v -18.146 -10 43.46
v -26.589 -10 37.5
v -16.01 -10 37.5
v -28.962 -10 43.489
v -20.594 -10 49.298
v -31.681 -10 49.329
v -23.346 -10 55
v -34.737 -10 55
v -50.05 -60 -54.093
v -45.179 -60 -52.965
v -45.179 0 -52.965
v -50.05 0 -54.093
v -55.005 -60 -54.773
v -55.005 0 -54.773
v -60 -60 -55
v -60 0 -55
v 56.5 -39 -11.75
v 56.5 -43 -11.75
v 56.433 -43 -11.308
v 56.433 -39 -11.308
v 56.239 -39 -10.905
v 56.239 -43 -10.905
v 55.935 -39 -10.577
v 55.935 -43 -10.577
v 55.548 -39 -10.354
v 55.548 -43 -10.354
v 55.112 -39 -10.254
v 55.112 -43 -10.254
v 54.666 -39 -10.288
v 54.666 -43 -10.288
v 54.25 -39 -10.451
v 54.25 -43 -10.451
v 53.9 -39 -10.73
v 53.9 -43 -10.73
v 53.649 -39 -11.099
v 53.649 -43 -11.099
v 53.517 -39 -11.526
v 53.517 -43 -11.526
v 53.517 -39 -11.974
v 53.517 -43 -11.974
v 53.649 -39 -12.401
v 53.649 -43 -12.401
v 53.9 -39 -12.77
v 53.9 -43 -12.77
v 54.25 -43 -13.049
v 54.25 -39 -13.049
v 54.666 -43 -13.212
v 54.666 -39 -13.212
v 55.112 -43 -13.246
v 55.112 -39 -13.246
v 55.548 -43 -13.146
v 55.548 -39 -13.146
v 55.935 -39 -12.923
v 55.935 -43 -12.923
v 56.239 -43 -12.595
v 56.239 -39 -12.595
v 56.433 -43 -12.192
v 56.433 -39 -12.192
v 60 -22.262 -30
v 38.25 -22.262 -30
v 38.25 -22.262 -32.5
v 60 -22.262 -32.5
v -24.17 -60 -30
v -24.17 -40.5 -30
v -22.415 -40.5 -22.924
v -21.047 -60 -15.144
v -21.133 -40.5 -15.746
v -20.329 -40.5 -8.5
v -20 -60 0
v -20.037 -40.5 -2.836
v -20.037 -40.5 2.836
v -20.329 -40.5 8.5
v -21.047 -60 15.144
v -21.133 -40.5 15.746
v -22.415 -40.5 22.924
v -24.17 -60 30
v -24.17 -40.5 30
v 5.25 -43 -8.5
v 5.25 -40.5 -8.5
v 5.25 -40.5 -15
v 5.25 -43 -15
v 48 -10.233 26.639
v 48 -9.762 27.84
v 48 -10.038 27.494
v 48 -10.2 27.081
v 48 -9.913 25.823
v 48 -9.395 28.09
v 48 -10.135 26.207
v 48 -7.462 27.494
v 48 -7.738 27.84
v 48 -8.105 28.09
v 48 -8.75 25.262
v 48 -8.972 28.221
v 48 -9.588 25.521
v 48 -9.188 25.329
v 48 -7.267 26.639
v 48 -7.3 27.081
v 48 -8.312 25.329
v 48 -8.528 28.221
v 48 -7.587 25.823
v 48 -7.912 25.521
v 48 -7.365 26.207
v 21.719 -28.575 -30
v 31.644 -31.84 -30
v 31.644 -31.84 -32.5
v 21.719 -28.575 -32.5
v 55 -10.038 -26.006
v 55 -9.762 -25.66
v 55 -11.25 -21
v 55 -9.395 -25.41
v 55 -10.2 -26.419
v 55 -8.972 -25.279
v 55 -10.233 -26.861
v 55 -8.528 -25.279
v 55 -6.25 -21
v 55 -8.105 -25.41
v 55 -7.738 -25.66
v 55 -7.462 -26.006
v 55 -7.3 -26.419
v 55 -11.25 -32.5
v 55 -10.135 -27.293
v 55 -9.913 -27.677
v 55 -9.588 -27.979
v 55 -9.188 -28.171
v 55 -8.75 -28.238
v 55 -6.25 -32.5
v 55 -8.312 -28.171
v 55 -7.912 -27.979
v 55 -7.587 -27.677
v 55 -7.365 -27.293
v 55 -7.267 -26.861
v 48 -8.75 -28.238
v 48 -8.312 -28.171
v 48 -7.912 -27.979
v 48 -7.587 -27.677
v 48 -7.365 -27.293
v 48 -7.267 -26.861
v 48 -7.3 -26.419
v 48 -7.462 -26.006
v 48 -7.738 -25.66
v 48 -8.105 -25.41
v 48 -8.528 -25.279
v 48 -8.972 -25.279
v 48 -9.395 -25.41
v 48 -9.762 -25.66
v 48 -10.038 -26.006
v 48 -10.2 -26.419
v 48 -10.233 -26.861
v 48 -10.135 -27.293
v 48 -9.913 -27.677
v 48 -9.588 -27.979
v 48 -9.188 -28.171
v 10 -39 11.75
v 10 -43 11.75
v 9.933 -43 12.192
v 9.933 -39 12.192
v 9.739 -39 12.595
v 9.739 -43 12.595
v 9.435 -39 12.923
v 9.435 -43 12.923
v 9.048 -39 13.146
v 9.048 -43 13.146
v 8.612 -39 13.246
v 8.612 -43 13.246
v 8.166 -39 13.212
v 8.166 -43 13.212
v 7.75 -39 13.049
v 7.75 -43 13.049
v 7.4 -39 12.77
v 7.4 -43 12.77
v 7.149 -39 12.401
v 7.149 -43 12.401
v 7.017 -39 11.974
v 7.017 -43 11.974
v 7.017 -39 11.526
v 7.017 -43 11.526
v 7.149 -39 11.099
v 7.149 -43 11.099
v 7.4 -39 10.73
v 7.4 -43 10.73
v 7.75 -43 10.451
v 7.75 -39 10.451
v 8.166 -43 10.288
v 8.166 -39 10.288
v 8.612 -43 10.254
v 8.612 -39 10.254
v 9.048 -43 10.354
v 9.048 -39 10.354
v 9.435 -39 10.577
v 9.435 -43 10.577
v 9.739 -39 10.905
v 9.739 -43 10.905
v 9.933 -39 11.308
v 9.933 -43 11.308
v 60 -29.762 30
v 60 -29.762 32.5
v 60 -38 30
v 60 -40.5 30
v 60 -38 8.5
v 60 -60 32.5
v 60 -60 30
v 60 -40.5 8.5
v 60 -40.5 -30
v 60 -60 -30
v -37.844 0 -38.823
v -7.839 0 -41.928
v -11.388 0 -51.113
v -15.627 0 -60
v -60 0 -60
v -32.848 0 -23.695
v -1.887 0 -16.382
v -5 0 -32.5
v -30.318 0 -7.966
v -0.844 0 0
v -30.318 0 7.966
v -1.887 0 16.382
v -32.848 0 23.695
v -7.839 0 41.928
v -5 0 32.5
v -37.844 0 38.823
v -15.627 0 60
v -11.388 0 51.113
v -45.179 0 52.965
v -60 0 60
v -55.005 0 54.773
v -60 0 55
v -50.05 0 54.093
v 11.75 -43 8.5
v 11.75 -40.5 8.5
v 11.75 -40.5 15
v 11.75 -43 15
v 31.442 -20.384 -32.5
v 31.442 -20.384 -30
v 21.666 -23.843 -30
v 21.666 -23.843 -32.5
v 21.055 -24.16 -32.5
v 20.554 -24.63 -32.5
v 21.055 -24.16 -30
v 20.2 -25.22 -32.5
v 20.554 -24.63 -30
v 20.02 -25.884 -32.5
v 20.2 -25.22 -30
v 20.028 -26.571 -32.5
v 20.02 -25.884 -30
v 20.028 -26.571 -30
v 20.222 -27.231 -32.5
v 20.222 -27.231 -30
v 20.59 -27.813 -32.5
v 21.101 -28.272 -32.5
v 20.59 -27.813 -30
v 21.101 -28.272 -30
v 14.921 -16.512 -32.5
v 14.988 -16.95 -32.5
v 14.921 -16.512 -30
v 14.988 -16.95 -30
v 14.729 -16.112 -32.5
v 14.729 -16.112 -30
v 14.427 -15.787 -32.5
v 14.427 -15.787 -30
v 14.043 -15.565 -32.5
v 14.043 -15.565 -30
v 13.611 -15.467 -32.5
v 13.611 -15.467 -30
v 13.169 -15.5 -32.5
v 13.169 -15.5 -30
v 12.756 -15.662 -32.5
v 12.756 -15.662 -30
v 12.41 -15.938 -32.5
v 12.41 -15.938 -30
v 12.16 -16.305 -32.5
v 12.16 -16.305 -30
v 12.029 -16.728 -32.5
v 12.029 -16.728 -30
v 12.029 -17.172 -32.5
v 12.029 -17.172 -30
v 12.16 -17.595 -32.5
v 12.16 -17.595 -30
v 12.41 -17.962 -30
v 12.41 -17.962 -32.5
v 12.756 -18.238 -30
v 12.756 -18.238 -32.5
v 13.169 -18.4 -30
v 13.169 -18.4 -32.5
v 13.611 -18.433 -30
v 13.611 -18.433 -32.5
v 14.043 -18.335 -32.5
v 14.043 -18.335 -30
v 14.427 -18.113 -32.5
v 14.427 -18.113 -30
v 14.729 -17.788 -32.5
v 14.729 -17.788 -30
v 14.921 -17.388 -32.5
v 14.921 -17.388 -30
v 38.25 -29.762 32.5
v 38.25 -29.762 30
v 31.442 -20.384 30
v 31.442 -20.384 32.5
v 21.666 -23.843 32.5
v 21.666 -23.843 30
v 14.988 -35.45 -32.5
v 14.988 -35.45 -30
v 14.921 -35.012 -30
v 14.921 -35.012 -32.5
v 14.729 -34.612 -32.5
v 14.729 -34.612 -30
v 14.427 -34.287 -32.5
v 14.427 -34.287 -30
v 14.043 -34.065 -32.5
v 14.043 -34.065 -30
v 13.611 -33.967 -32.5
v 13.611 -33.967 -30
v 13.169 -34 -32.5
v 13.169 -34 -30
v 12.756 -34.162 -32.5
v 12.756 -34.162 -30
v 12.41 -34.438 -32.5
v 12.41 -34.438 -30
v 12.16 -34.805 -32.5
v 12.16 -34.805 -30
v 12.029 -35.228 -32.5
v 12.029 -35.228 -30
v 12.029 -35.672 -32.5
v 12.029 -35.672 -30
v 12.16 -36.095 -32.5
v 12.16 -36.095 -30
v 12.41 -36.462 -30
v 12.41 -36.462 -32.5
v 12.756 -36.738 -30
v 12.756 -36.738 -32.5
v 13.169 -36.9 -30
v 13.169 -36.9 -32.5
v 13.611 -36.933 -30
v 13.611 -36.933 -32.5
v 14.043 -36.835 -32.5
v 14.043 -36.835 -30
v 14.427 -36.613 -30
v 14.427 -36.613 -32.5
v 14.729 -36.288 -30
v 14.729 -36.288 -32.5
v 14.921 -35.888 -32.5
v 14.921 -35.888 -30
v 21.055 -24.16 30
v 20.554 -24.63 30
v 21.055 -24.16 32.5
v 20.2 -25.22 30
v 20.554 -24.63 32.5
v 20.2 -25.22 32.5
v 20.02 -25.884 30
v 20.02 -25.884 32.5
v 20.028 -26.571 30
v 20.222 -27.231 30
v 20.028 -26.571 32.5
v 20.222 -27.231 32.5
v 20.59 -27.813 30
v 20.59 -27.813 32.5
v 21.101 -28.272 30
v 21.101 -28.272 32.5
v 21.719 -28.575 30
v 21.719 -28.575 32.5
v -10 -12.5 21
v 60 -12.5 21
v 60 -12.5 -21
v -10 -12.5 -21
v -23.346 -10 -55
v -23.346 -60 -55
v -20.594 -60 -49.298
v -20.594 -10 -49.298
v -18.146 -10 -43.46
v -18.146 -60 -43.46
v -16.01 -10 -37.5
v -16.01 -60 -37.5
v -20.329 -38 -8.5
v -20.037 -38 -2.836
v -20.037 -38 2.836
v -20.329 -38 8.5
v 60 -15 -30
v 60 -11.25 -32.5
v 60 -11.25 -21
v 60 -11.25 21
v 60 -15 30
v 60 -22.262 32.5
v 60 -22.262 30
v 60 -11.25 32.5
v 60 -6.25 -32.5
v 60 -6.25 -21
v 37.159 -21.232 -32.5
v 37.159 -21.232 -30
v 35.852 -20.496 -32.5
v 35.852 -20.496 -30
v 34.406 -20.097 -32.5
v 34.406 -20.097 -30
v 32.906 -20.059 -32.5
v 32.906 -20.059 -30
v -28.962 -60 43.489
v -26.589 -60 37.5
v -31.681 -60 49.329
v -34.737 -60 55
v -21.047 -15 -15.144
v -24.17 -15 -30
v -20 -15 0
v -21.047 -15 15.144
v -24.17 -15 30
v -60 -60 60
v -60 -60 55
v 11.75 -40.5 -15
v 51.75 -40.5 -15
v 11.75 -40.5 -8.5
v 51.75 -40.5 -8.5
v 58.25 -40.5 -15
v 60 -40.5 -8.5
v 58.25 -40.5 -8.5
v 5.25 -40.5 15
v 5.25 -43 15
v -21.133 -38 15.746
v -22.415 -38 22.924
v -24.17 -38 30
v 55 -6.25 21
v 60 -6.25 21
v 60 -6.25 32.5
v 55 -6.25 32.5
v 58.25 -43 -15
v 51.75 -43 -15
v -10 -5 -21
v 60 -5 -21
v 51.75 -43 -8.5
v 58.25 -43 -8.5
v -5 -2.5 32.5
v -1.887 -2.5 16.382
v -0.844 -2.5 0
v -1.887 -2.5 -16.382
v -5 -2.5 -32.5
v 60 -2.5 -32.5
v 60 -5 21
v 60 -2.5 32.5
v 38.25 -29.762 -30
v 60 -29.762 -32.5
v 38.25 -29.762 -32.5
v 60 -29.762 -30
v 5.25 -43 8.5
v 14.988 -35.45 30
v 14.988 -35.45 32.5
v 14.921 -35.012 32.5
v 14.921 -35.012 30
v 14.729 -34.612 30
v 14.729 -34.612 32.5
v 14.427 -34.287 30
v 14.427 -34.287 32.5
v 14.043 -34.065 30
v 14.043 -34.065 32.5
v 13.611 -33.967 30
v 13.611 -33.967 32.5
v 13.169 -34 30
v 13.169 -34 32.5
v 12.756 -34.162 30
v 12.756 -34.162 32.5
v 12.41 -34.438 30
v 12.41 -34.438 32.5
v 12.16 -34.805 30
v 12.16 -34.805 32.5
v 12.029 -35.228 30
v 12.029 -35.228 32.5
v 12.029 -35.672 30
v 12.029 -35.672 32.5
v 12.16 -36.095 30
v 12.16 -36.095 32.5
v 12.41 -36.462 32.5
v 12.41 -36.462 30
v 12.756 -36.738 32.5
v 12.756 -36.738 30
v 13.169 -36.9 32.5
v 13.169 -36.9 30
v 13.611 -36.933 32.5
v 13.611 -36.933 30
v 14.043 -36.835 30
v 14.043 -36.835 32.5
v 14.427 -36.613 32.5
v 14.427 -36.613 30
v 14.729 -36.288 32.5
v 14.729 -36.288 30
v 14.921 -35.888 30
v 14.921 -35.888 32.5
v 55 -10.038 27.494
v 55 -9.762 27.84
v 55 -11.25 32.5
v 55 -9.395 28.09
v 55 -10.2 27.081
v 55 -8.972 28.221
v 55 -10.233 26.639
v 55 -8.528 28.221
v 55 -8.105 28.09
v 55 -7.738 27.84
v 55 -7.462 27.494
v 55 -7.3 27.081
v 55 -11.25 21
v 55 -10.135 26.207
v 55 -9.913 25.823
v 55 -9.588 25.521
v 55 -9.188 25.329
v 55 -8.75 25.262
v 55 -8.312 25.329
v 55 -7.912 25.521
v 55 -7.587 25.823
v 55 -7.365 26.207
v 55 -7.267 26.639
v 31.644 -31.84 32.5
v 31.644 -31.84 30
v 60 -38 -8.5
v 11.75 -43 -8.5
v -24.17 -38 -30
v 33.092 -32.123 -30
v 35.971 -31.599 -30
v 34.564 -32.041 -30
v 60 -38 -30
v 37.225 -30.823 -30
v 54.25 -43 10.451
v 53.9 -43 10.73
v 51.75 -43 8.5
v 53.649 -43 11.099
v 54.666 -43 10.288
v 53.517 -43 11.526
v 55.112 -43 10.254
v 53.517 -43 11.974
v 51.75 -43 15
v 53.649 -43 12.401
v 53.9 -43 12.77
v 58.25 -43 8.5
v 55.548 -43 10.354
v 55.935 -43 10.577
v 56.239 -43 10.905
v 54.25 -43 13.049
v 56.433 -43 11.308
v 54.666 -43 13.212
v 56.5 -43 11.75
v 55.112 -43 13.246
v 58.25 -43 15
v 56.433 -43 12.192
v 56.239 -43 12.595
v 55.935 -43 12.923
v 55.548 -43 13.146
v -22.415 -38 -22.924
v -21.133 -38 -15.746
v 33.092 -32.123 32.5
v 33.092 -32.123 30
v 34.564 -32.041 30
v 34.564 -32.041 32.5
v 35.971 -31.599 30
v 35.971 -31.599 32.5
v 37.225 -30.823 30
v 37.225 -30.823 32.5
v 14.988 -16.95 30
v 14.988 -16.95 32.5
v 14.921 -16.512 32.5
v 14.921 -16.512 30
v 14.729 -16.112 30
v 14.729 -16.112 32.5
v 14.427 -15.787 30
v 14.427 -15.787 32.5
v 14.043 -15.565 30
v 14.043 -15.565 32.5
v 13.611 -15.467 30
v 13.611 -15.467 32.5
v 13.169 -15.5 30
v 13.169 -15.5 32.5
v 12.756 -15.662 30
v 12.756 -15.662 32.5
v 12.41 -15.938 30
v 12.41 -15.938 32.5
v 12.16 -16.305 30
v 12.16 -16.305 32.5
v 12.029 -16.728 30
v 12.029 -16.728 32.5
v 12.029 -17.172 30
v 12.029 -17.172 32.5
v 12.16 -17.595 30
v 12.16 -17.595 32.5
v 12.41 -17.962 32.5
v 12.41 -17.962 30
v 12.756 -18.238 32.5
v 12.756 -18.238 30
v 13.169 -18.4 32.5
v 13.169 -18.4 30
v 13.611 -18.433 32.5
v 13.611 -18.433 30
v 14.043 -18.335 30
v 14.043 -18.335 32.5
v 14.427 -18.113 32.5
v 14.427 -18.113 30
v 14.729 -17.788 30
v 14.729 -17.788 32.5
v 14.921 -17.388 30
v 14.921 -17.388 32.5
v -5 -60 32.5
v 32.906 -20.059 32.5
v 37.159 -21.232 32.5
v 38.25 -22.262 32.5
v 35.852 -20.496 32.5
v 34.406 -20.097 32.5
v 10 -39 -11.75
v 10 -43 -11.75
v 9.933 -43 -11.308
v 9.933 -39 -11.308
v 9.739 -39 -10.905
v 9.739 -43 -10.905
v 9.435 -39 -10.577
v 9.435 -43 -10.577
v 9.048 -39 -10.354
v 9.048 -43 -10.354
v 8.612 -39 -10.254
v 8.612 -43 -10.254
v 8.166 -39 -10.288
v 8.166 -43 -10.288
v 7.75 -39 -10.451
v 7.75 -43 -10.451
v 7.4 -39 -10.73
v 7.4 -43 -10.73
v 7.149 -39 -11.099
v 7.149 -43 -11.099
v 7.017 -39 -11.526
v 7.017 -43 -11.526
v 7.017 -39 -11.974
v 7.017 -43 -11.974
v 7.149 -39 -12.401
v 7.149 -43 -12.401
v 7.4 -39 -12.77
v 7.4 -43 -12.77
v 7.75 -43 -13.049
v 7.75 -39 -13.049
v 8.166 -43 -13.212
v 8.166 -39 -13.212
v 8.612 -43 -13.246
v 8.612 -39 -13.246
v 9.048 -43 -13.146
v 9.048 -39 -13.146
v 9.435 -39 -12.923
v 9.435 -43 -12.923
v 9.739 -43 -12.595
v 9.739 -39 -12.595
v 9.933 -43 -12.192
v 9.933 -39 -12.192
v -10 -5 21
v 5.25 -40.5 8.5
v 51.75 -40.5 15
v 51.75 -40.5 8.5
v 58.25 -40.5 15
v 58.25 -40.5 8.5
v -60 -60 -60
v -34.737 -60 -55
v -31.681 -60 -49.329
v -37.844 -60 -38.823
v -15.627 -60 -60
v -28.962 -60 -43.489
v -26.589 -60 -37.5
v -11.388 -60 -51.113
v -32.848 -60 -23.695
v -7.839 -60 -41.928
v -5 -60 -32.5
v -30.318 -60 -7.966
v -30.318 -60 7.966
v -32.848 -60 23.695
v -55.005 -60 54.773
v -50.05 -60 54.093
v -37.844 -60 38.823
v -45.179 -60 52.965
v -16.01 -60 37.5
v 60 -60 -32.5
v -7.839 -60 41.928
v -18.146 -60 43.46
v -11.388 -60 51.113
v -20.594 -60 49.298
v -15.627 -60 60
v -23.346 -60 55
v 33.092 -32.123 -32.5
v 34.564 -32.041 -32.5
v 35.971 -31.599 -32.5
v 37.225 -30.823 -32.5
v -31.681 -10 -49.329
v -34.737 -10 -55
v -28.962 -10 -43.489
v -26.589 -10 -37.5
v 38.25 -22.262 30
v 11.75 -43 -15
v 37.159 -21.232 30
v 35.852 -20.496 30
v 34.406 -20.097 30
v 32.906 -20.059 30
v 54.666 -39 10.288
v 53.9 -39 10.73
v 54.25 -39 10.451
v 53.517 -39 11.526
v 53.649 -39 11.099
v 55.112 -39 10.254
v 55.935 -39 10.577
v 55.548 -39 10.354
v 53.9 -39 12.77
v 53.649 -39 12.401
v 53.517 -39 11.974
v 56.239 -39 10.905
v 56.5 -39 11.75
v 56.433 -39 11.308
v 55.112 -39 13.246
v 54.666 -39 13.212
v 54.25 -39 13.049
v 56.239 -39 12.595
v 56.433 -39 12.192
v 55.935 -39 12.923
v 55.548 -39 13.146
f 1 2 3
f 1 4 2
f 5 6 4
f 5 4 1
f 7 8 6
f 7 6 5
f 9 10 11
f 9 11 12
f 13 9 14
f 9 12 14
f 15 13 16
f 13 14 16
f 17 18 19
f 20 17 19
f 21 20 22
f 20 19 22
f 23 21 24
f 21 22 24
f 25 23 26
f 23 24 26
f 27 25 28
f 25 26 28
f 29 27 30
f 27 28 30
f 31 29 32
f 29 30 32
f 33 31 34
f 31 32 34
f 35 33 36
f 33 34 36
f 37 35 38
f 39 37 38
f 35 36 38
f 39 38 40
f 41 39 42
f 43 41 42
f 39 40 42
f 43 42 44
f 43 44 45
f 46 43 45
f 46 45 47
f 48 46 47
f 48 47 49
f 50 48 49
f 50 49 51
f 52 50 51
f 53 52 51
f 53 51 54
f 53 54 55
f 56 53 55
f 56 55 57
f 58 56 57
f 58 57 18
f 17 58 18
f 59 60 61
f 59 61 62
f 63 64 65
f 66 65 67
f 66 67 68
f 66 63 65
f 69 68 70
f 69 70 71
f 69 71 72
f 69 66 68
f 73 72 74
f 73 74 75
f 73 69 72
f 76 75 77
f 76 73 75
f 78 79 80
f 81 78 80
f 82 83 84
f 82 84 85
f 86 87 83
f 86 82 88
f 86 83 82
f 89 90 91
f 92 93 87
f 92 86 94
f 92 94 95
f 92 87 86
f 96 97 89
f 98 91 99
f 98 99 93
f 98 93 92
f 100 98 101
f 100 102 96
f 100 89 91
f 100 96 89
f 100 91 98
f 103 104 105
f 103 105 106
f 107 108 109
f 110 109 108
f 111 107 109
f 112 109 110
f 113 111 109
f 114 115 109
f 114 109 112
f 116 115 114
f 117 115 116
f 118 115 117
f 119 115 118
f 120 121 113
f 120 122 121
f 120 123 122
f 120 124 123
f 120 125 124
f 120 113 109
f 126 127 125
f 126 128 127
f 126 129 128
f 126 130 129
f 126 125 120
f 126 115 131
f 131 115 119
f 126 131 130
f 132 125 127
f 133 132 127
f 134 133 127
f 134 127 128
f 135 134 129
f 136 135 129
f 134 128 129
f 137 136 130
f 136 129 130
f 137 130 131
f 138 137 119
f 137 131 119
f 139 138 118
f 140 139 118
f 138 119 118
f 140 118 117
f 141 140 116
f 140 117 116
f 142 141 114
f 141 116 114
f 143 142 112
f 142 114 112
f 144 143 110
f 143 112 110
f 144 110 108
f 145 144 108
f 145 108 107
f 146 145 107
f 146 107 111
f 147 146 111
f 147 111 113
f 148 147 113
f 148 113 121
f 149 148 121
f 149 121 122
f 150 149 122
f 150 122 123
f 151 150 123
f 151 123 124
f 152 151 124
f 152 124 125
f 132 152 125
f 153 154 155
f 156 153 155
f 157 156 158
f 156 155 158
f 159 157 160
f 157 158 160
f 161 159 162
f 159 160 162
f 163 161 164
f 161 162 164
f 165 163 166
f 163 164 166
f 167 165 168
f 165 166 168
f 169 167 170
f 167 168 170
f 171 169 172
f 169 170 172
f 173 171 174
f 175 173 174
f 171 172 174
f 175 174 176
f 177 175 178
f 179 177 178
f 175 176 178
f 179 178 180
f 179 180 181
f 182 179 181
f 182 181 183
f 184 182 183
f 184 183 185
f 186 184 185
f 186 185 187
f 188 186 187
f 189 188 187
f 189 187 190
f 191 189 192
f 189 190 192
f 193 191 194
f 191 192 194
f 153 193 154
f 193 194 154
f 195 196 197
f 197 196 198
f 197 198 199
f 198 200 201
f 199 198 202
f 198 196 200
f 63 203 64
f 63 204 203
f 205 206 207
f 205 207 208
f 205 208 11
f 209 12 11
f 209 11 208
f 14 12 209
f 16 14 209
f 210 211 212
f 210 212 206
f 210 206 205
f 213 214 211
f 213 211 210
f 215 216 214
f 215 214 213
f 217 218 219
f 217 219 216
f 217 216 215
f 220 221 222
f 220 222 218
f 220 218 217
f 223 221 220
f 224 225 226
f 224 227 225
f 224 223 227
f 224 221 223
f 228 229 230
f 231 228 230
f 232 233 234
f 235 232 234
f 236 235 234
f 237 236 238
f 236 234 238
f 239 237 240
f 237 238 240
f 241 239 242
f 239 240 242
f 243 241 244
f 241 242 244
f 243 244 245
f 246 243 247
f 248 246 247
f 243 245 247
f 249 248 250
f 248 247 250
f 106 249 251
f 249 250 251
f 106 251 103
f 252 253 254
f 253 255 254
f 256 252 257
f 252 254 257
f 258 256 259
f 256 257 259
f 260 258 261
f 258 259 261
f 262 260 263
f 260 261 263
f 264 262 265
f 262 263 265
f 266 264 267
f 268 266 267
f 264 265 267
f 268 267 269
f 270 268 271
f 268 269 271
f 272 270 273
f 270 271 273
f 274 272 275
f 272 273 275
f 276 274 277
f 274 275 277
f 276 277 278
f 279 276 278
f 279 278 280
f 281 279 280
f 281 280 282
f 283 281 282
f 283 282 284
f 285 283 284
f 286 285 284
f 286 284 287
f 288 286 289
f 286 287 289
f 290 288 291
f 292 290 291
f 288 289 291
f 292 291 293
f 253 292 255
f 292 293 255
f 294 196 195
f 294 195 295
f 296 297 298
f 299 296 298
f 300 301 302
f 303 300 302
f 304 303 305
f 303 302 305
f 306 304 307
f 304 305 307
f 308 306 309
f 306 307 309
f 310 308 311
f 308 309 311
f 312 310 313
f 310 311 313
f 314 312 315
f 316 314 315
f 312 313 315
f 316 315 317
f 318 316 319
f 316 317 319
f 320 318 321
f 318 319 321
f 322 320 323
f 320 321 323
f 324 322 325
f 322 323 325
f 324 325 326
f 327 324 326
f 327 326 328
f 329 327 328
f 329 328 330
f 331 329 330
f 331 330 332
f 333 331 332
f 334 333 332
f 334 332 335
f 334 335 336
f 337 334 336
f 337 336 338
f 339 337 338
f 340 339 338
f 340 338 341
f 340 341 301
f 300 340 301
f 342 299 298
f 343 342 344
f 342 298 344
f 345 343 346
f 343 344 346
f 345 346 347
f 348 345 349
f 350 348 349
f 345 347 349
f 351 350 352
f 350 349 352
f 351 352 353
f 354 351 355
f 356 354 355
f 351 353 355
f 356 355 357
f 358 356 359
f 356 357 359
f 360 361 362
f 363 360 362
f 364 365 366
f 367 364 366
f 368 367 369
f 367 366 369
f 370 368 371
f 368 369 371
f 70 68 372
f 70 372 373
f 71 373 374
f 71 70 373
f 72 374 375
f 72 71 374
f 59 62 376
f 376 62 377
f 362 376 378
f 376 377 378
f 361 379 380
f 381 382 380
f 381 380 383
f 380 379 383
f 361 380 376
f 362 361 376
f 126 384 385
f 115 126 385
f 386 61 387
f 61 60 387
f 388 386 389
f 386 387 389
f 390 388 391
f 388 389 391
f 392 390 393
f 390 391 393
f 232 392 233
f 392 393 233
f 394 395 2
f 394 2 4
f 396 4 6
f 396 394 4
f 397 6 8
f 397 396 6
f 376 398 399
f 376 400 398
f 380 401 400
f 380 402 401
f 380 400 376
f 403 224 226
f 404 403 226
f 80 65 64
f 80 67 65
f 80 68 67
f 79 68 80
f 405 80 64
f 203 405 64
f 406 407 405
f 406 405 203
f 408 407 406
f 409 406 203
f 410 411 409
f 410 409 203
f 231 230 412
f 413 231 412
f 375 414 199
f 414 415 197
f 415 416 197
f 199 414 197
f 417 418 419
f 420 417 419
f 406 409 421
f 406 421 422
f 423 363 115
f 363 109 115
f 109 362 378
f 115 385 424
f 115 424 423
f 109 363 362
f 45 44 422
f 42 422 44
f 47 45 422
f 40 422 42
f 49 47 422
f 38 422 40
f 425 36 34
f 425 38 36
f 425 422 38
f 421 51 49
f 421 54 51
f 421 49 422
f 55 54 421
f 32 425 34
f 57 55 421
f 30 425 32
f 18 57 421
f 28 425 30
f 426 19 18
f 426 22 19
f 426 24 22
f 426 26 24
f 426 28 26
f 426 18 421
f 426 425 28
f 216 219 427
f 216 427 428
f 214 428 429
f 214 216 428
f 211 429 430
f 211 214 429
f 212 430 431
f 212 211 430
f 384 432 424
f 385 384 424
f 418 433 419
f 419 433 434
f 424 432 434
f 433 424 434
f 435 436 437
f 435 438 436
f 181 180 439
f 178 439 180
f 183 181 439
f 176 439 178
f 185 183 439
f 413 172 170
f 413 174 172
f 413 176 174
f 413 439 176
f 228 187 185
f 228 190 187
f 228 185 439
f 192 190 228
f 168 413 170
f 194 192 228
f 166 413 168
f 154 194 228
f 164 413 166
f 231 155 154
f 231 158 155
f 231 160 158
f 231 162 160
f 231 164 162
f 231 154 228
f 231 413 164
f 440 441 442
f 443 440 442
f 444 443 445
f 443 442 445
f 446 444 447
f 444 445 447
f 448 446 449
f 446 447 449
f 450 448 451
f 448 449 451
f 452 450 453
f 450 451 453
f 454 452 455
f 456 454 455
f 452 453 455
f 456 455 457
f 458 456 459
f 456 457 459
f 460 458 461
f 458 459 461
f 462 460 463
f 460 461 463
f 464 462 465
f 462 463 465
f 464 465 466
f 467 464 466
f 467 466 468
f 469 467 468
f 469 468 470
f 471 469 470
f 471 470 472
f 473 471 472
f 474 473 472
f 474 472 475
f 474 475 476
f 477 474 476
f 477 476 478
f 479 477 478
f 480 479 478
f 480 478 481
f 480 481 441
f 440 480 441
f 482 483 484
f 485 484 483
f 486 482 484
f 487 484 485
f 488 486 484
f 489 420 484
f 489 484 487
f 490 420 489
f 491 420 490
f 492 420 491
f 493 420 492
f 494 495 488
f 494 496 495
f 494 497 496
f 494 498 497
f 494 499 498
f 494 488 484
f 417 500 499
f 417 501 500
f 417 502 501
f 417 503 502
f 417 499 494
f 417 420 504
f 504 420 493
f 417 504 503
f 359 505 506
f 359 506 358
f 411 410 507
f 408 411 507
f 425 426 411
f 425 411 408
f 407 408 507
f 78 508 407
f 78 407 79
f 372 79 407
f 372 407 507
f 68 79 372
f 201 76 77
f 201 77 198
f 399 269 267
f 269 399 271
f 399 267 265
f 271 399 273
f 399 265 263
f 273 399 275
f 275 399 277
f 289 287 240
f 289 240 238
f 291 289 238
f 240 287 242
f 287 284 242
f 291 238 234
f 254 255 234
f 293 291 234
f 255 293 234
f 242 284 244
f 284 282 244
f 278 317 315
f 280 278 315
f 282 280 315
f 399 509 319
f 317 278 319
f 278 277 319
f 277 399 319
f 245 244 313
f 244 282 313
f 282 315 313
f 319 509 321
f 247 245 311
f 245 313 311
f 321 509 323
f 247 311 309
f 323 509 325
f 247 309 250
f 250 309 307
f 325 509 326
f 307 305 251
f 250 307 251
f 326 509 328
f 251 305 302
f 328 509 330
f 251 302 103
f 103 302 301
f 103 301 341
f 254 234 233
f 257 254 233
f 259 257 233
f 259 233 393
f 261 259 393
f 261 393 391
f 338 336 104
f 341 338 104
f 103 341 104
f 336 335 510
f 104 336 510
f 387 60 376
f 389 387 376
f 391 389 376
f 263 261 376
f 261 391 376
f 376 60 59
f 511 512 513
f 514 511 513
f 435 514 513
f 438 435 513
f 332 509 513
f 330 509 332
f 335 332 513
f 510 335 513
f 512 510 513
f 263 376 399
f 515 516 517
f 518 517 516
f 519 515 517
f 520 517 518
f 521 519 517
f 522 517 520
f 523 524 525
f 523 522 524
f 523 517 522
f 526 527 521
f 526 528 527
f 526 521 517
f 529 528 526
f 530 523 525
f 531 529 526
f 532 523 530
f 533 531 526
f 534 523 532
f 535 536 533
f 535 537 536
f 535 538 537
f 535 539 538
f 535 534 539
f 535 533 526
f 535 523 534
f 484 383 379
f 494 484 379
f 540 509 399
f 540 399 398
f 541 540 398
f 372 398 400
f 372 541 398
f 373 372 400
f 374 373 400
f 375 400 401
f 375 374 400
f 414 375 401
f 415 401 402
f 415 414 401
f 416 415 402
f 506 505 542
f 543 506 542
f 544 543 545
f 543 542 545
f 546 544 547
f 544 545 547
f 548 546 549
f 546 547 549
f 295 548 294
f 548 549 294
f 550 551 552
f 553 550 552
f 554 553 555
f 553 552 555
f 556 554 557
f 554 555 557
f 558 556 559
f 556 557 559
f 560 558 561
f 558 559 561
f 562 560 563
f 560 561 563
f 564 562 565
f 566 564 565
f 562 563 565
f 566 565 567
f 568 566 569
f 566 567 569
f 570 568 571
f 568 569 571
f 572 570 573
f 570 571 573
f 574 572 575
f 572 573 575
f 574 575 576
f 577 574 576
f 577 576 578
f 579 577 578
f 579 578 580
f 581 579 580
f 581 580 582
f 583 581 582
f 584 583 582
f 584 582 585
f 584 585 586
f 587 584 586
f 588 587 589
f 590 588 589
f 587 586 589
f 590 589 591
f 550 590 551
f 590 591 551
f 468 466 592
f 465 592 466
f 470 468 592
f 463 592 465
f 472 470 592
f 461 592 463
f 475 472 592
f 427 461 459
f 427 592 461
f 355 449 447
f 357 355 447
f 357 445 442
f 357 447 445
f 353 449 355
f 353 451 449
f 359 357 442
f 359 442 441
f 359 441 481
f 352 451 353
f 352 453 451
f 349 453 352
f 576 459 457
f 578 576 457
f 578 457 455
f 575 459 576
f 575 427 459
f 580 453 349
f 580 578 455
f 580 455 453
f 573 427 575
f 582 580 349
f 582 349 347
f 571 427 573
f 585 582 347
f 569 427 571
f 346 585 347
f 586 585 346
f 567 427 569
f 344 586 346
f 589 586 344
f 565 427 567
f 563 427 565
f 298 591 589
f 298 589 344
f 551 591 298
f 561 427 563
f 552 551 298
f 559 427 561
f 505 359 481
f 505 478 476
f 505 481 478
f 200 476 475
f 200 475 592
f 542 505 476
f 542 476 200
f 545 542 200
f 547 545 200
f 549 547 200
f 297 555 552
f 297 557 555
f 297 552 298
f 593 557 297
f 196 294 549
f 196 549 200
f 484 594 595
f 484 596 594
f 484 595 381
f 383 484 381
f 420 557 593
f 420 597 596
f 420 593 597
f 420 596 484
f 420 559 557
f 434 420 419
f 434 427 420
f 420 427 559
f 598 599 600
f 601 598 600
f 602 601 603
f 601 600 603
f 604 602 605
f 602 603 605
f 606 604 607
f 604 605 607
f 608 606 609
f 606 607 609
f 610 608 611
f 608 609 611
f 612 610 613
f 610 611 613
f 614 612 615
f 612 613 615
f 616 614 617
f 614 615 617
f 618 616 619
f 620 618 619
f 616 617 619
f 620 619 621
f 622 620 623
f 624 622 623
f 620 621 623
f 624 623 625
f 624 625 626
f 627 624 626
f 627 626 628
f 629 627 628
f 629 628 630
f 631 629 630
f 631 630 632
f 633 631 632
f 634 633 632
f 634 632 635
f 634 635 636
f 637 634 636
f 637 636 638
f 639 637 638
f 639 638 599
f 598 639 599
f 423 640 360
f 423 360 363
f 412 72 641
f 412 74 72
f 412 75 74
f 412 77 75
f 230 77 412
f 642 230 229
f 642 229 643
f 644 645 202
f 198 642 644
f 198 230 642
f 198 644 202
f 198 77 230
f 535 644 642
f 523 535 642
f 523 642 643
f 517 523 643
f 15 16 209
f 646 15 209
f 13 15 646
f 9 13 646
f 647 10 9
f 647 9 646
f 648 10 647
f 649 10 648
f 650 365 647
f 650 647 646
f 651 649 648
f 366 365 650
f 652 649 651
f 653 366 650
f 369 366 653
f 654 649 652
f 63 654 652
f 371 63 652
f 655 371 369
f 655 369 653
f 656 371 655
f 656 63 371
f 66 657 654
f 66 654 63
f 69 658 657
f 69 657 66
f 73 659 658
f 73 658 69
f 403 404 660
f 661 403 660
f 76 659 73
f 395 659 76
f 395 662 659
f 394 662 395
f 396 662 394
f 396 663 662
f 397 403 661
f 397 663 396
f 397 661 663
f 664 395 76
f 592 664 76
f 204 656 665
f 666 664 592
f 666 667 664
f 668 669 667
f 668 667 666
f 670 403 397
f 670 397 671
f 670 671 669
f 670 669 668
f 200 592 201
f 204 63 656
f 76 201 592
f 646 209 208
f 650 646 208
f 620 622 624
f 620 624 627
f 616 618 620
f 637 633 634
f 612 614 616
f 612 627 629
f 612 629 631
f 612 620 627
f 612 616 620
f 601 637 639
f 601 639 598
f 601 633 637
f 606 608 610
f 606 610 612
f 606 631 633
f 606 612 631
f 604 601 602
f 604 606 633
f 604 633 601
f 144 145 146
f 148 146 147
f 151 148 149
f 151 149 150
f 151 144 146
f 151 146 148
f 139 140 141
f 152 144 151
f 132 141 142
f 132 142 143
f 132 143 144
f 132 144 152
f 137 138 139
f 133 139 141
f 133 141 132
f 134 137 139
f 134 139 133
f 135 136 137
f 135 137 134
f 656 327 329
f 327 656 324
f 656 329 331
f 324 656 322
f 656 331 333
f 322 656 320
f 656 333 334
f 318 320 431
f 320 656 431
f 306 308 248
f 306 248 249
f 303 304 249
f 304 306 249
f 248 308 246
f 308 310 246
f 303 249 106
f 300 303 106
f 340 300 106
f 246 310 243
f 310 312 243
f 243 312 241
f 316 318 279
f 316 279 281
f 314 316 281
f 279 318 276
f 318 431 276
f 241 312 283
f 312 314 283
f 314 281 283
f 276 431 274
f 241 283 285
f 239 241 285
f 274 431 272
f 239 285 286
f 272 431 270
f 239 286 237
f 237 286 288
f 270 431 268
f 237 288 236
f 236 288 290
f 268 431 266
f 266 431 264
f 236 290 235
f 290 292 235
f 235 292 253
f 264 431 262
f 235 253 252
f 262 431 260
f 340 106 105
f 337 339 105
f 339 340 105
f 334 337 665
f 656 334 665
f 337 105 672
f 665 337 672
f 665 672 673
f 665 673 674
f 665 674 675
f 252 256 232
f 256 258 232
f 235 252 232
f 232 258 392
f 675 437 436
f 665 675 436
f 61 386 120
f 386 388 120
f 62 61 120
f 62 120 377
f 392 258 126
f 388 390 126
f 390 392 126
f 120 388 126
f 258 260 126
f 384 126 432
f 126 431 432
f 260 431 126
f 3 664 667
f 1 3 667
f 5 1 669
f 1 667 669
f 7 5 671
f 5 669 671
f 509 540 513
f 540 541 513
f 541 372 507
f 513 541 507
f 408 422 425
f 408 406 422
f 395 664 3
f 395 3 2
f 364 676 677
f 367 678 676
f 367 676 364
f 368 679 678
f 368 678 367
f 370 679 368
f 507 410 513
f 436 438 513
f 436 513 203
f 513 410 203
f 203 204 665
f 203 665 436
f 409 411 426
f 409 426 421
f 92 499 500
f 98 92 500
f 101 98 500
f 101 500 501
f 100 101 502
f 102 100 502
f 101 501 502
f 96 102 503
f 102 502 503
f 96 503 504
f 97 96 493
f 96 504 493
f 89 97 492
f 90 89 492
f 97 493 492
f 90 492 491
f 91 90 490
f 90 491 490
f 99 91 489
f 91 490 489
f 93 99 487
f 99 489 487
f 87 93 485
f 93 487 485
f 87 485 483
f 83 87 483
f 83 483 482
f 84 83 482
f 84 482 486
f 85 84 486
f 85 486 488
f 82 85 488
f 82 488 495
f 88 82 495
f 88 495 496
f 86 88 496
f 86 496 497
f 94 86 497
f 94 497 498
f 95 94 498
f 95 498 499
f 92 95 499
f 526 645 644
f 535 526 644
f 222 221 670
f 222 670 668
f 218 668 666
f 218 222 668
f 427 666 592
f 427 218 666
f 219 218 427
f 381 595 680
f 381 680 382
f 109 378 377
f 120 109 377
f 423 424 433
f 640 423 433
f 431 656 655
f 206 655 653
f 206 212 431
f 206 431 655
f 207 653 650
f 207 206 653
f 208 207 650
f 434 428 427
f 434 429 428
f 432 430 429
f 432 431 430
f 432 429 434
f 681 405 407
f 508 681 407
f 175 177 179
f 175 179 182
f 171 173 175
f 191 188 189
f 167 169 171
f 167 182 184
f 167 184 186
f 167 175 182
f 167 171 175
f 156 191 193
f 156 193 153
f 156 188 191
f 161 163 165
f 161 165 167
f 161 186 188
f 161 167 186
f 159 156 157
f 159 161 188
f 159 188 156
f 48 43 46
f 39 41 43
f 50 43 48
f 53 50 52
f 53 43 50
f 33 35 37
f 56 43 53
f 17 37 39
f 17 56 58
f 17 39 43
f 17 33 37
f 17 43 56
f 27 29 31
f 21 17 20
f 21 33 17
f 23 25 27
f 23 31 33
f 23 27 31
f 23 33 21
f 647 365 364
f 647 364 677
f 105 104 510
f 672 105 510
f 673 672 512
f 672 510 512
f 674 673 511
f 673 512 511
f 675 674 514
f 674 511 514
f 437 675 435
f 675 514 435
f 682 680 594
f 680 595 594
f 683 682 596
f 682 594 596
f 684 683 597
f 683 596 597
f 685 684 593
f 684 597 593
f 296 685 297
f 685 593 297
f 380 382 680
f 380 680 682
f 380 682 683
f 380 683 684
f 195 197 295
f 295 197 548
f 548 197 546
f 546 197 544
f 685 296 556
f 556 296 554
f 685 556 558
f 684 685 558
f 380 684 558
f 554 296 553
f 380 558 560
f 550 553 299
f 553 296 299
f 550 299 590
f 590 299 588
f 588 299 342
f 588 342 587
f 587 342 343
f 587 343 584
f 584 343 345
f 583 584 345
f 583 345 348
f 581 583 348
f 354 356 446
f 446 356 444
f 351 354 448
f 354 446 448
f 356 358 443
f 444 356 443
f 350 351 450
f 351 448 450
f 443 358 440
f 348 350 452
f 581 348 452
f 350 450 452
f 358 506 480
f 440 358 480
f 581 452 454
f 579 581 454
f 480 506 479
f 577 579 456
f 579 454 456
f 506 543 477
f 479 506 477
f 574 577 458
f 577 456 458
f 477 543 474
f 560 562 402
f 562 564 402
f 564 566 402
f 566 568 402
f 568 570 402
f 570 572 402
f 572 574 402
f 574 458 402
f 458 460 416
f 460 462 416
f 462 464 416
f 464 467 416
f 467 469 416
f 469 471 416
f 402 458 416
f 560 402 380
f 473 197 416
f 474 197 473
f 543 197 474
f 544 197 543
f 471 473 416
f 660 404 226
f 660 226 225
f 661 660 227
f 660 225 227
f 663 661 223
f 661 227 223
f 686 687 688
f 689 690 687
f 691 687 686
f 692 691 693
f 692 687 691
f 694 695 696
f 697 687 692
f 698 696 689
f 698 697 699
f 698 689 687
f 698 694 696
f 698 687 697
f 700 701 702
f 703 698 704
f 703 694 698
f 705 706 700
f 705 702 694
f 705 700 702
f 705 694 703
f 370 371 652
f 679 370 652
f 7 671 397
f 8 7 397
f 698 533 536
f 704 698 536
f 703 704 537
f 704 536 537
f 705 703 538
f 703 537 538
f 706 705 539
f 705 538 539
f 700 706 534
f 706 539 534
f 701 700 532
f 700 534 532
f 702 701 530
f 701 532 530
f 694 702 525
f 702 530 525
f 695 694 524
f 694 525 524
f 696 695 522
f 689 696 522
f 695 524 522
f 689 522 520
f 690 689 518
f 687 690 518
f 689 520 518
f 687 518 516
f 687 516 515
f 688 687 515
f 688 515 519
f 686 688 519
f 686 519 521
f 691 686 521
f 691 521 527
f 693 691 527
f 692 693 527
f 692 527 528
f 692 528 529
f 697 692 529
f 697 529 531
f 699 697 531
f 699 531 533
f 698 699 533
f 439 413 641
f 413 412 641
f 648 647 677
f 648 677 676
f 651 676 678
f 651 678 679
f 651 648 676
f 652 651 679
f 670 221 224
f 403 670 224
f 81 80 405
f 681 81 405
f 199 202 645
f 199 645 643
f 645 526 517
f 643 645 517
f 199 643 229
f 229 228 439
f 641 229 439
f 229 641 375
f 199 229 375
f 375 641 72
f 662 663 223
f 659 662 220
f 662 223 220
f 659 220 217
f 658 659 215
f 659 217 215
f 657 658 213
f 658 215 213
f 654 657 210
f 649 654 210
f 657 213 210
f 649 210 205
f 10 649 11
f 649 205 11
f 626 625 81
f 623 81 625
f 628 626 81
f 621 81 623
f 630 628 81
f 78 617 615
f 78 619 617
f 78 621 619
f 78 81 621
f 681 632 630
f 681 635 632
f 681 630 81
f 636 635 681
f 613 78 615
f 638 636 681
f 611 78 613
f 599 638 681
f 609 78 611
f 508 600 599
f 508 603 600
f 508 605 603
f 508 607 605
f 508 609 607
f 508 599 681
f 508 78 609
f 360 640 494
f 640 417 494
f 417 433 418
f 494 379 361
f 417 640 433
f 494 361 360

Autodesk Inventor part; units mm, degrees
ref_plane "YZ Plane" through (0, 0, 0) normal (1, 0, 0) x (0, 1, 0)
ref_plane "XZ Plane" through (0, 0, 0) normal (0, 1, 0) x (-1, 0, 0)
ref_plane "XY Plane" through (0, 0, 0) normal (0, 0, 1) x (1, 0, 0)
sketch "Boceto2" plane through (0, 0, 0) normal (0, 1, 0) x (-1, 0, 0)
  line L0 (60, -60) -> (15.6267, -60)
  line L1 (15.6267, 60) -> (60, 60)
  arc A0 (45.1786, 52.9653) -> (45.1786, -52.9653) centre (130, 0) ccw
  arc A1 (45.1786, -52.9653) -> (60, -55) centre (60, 0) ccw
  arc A2 (60, 55) -> (45.1786, 52.9653) centre (60, 0) ccw
  line L2 (60, 60) -> (60, 55)
  line L3 (60, -55) -> (60, -60)
  line L4 (5, 32.5) -> (-60, 32.5)
  line L5 (5, -32.5) -> (-60, -32.5)
  line L6 (-60, -32.5) -> (-60, 32.5)
  arc A3 (15.6267, 60) -> (5, 32.5) centre (130, 0) ccw
  arc A4 (5, -32.5) -> (15.6267, -60) centre (130, 0) ccw
  line L7 (-60, 0) -> (60, 0) construction
  point P0 (0, 0)
  point P1 (30, 0)
  dimension "d8" = 200
  dimension "d13" = 65
  dimension "d17" = 65
  dimension "d18" = 65
  dimension "d19" = 30
extrude "Extrusión1" add sketch "Boceto2" against normal blind 60
sketch "Boceto4" plane through (0, -60, 0) normal (0, -1, 0) x (1, 0, 0)
  line L0 (60, -32.5) -> (60, 32.5) projected
  line L1 (60, -30) -> (60, 30)
  arc A0 (-24.1699, -30) -> (-24.1699, 30) centre (-130, 0) ccw
  arc A1 (-45.1786, -52.9653) -> (-45.1786, 52.9653) centre (-130, 0) ccw projected
  line L2 (-24.1699, -30) -> (60, -30)
  line L3 (60, 30) -> (-24.1699, 30)
  point P0 (0, 0)
  point P1 (-40, 0)
  point P2 (-30, 0)
  dimension "d26" = 100
  dimension "d27" = 220
  dimension "d28" = 60
extrude "Extrusión2" cut sketch "Boceto4" against normal blind 45
sketch "Boceto5" plane through (-5, 0, 32.5) normal (0, 0, 1) x (1, 0, 0)
  line L0 (65, 0) -> (65, -60) projected
  line L1 (65, -60) -> (0, -60) projected
  line L2 (38.5, -26.2) -> (0, -26.2) construction
  line L3 (0, 0) -> (0, -60) projected
  arc A0 (26.666, -23.8432) -> (26.7187, -28.5748) centre (27.5, -26.2) ccw
  line L4 (36.4416, -20.3837) -> (26.666, -23.8432)
  line L5 (36.6445, -31.8401) -> (26.7187, -28.5748)
  line L6 (65, -29.7625) -> (43.25, -29.7625)
  line L7 (43.25, -22.2625) -> (65, -22.2625)
  line L8 (65, -22.2625) -> (65, -29.7625)
  arc A1 (36.6445, -31.8401) -> (43.25, -29.7625) centre (38.5, -26.2) ccw
  arc A2 (43.25, -22.2625) -> (36.4416, -20.3837) centre (38.5, -26.2) ccw
  circle A3 centre (18.5, -35.45) radius 1.4875
  circle A4 centre (18.5, -16.95) radius 1.4875
  point P0 (5, 0)
  point P1 (44.75, -26.2)
  dimension "d29" = 26.5
  dimension "d31" = 33.8
  dimension "d32" = 5
  dimension "d33" = 11
  dimension "d34" = 7.5
  dimension "d38" = 46.5
  dimension "d39" = 24.55
  dimension "d40" = 2.975
extrude "Extrusión3" cut sketch "Boceto5" against normal blind 65
sketch "Boceto7" plane through (0, -60, 0) normal (0, -1, 0) x (1, 0, 0)
  arc A0 (-24.1699, -30) -> (-24.1699, 30) centre (-130, 0) ccw projected
  line L0 (60, -30) -> (-24.1699, -30) projected
  line L1 (-24.1699, 30) -> (60, 30) projected
  line L2 (60, 30) -> (60, -30) projected
  point P0 (0, 0)
extrude "Extrusión4" add sketch "Boceto7" against normal blind 22
sketch "Boceto8" plane through (0, -60, 0) normal (0, -1, 0) x (1, 0, 0)
  line L0 (60, -30) -> (-24.1699, -30) projected
  arc A0 (-24.1699, -30) -> (-24.1699, 30) centre (-130, 0) ccw projected
  line L1 (-24.1699, 30) -> (60, 30) projected
  line L2 (60, -30) -> (60, 30)
  point P0 (0, 0)
extrude "Extrusión5" cut sketch "Boceto8" against normal blind 19.5
sketch "Boceto9" plane through (0, -40.5, 0) normal (0, -1, 0) x (1, 0, 0)
  line L0 (60, 8.5) -> (60, -8.5)
  arc A0 (-20.3289, -8.5) -> (-20.3289, 8.5) centre (-130, 0) ccw
  line L1 (60, 30) -> (60, -30) projected
  line L2 (60, -8.5) -> (-20.3289, -8.5)
  line L3 (60, 8.5) -> (-20.3289, 8.5)
  point P0 (0, 0)
  point P1 (60, -10)
  point P2 (60, 10)
  point P3 (-30, 0)
  dimension "d52" = 8.5
  dimension "d53" = 8.5
extrude "Extrusión6" cut sketch "Boceto9" against normal blind 2.5
sketch "Boceto10" plane through (0, -40.5, 0) normal (0, -1, 0) x (1, 0, 0)
  line L0 (55, 11.75) -> (8.5, 11.75) construction
  line L1 (8.5, 11.75) -> (8.5, -11.75) construction
  line L2 (8.5, -11.75) -> (55, -11.75) construction
  line L3 (55, -11.75) -> (55, 11.75) construction
  line L4 (60, 30) -> (60, 8.5) construction
  line L5 (-20.3289, 8.5) -> (60, 8.5) construction
  line L6 (58.25, 15) -> (51.75, 15)
  line L7 (51.75, 15) -> (51.75, 8.5)
  line L8 (51.75, 8.5) -> (58.25, 8.5)
  line L9 (58.25, 8.5) -> (58.25, 15)
  line L10 (58.25, 15) -> (51.75, 8.5) construction
  line L11 (51.75, 15) -> (58.25, 8.5) construction
  line L12 (60, -8.5) -> (-20.3289, -8.5) construction
  line L13 (58.25, -15) -> (51.75, -15)
  line L14 (51.75, -15) -> (51.75, -8.5)
  line L15 (51.75, -8.5) -> (58.25, -8.5)
  line L16 (58.25, -8.5) -> (58.25, -15)
  line L17 (58.25, -15) -> (51.75, -8.5) construction
  line L18 (51.75, -15) -> (58.25, -8.5) construction
  line L19 (5.25, -15) -> (11.75, -15)
  line L20 (11.75, -15) -> (11.75, -8.5)
  line L21 (11.75, -8.5) -> (5.25, -8.5)
  line L22 (5.25, -8.5) -> (5.25, -15)
  line L23 (5.25, -15) -> (11.75, -8.5) construction
  line L24 (11.75, -15) -> (5.25, -8.5) construction
  line L25 (11.75, 15) -> (5.25, 15)
  line L26 (5.25, 15) -> (5.25, 8.5)
  line L27 (5.25, 8.5) -> (11.75, 8.5)
  line L28 (11.75, 8.5) -> (11.75, 15)
  line L29 (11.75, 15) -> (5.25, 8.5) construction
  line L30 (5.25, 15) -> (11.75, 8.5) construction
  point P0 (0, 0)
  point P1 (8.5, 0)
  dimension "d50" = 46.5
  dimension "d51" = 23.5
  dimension "d54" = 5
  dimension "d55" = 6.5
  dimension "d56" = 6.5
extrude "Extrusión7" add sketch "Boceto10" along normal blind 2.5
sketch "Boceto11" plane through (0, -43, 0) normal (0, -1, 0) x (1, 0, 0)
  line L0 (5.25, 8.5) -> (11.75, 8.5) construction
  line L1 (5.25, 8.5) -> (5.25, 11.75) construction
  line L2 (5.25, 8.5) -> (5.25, 15) construction
  line L3 (11.75, 8.5) -> (11.75, 15) construction
  line L4 (11.75, 11.75) -> (5.25, 11.75) construction
  line L5 (8.5, 11.75) -> (55, 11.75) construction
  line L6 (55, 11.75) -> (55, -11.75) construction
  line L7 (55, -11.75) -> (8.5, -11.75) construction
  line L8 (8.5, -11.75) -> (8.5, 11.75) construction
  circle A0 centre (8.5, 11.75) radius 1.5
  circle A1 centre (8.5, -11.75) radius 1.5
  circle A2 centre (55, 11.75) radius 1.5
  circle A3 centre (55, -11.75) radius 1.5
  point P0 (0, 0)
  dimension "d59" = 46.5
  dimension "d60" = 23.5
  dimension "d62" = 3
extrude "Extrusión8" cut sketch "Boceto11" against normal blind 4
sketch "Boceto12" plane through (0, -60, 0) normal (0, -1, 0) x (1, 0, 0)
  arc A0 (-45.1786, -52.9653) -> (-45.1786, 52.9653) centre (-130, 0) ccw projected
  line L0 (-60, -60) -> (-15.6267, -60) projected
  line L1 (-23.3464, -55) -> (-34.7372, -55)
  arc A1 (-5, 32.5) -> (-15.6267, 60) centre (-130, 0) ccw projected
  line L2 (-23.3464, 55) -> (-34.7372, 55)
  arc A2 (-15.6267, -60) -> (-5, -32.5) centre (-130, 0) ccw projected
  arc A3 (-26.5894, 37.5) -> (-34.7372, 55) centre (-130, 0) ccw
  arc A4 (-34.7372, -55) -> (-26.5894, -37.5) centre (-130, 0) ccw
  arc A5 (-16.0099, 37.5) -> (-23.3464, 55) centre (-130, 0) ccw
  arc A6 (-23.3464, -55) -> (-16.0099, -37.5) centre (-130, 0) ccw
  line L3 (-16.0099, 37.5) -> (-26.5894, 37.5)
  line L4 (-16.0099, -37.5) -> (-26.5894, -37.5)
  point P0 (0, 0)
extrude "Extrusión9" cut sketch "Boceto12" against normal blind 50
sketch "Boceto14" plane through (60, 0, 32.5) normal (1, 0, 0) x (0, 0, -1)
  line L0 (65, 0) -> (65, -22.2625) construction
  line L1 (0, 0) -> (0, -60) construction
  line L2 (65, -5) -> (0, -5) construction
  line L3 (0, -6.25) -> (0, -11.25)
  line L4 (0, -12.5) -> (65, -12.5) construction
  line L5 (65, -11.25) -> (65, -6.25)
  line L6 (0, 0) -> (65, 0) construction
  line L7 (2.5, -15) -> (62.5, -15) construction
  line L8 (53.5, -5) -> (11.5, -5)
  line L9 (11.5, -12.5) -> (53.5, -12.5)
  line L10 (0, -6.25) -> (0, -11.25)
  line L11 (65, -11.25) -> (65, -6.25)
  line L12 (65, -6.25) -> (53.5, -6.25)
  line L13 (11.5, -6.25) -> (0, -6.25)
  line L14 (0, -11.25) -> (11.5, -11.25)
  line L15 (53.5, -11.25) -> (65, -11.25)
  line L16 (53.5, -12.5) -> (53.5, -11.25)
  line L17 (53.5, -6.25) -> (53.5, -5)
  line L18 (11.5, -5) -> (11.5, -6.25)
  line L19 (11.5, -11.25) -> (11.5, -12.5)
  point P0 (32.5, 0)
  point P1 (32.5, -5)
  point P2 (32.5, 0)
  dimension "d74" = 5
  dimension "d75" = 2.5
  dimension "d76" = 42
  dimension "d77" = 5
  dimension "d85" = 1.25
  dimension "d86" = 1.25
  dimension "d87" = 5
extrude "Extrusión10" cut sketch "Boceto14" against normal blind 5
sketch "Boceto15" plane through (55, 0, 32.5) normal (1, 0, 0) x (0, 0, -1)
  line L0 (53.5, -12.5) -> (11.5, -12.5) projected
  line L1 (11.5, -6.25) -> (11.5, -5) projected
  line L2 (53.5, -12.5) -> (11.5, -12.5)
  line L3 (11.5, -12.5) -> (11.5, -5)
  line L4 (11.5, -5) -> (53.5, -5)
  line L5 (53.5, -5) -> (53.5, -12.5)
  point P0 (32.5, 0)
extrude "Extrusión11" cut sketch "Boceto15" against normal blind 65
sketch "Boceto16" plane through (55, 0, 32.5) normal (1, 0, 0) x (0, 0, -1)
  line L0 (53.5, -6.25) -> (65, -6.25) construction
  line L1 (59.25, -6.25) -> (59.25, -11.25) construction
  line L2 (65, -11.25) -> (53.5, -11.25) construction
  circle A0 centre (59.25, -8.75) radius 1.4875
  line L3 (32.5, 0) -> (32.5, -15) construction
  line L4 (2.5, -15) -> (62.5, -15) construction
  circle A1 centre (5.75, -8.75) radius 1.4875
  dimension "d82" = 2.975
extrude "Extrusión12" cut sketch "Boceto16" against normal blind 7
sketch "Boceto17" plane through (0, 0, 0) normal (0, 1, 0) x (1, 0, 0)
  arc A0 (-45.1786, -52.9653) -> (-45.1786, 52.9653) centre (-130, 0) ccw construction
  line L0 (-5, 32.5) -> (60, 32.5) projected
  arc A1 (-5, -32.5) -> (-5, 32.5) centre (-130, 0) ccw
  line L1 (60, -32.5) -> (60, 32.5) projected
  line L2 (-5, -32.5) -> (60, -32.5) projected
  point P0 (0, 0)
extrude "Extrusión13" cut sketch "Boceto17" against normal blind 2.5
properties part number "Chasis"
